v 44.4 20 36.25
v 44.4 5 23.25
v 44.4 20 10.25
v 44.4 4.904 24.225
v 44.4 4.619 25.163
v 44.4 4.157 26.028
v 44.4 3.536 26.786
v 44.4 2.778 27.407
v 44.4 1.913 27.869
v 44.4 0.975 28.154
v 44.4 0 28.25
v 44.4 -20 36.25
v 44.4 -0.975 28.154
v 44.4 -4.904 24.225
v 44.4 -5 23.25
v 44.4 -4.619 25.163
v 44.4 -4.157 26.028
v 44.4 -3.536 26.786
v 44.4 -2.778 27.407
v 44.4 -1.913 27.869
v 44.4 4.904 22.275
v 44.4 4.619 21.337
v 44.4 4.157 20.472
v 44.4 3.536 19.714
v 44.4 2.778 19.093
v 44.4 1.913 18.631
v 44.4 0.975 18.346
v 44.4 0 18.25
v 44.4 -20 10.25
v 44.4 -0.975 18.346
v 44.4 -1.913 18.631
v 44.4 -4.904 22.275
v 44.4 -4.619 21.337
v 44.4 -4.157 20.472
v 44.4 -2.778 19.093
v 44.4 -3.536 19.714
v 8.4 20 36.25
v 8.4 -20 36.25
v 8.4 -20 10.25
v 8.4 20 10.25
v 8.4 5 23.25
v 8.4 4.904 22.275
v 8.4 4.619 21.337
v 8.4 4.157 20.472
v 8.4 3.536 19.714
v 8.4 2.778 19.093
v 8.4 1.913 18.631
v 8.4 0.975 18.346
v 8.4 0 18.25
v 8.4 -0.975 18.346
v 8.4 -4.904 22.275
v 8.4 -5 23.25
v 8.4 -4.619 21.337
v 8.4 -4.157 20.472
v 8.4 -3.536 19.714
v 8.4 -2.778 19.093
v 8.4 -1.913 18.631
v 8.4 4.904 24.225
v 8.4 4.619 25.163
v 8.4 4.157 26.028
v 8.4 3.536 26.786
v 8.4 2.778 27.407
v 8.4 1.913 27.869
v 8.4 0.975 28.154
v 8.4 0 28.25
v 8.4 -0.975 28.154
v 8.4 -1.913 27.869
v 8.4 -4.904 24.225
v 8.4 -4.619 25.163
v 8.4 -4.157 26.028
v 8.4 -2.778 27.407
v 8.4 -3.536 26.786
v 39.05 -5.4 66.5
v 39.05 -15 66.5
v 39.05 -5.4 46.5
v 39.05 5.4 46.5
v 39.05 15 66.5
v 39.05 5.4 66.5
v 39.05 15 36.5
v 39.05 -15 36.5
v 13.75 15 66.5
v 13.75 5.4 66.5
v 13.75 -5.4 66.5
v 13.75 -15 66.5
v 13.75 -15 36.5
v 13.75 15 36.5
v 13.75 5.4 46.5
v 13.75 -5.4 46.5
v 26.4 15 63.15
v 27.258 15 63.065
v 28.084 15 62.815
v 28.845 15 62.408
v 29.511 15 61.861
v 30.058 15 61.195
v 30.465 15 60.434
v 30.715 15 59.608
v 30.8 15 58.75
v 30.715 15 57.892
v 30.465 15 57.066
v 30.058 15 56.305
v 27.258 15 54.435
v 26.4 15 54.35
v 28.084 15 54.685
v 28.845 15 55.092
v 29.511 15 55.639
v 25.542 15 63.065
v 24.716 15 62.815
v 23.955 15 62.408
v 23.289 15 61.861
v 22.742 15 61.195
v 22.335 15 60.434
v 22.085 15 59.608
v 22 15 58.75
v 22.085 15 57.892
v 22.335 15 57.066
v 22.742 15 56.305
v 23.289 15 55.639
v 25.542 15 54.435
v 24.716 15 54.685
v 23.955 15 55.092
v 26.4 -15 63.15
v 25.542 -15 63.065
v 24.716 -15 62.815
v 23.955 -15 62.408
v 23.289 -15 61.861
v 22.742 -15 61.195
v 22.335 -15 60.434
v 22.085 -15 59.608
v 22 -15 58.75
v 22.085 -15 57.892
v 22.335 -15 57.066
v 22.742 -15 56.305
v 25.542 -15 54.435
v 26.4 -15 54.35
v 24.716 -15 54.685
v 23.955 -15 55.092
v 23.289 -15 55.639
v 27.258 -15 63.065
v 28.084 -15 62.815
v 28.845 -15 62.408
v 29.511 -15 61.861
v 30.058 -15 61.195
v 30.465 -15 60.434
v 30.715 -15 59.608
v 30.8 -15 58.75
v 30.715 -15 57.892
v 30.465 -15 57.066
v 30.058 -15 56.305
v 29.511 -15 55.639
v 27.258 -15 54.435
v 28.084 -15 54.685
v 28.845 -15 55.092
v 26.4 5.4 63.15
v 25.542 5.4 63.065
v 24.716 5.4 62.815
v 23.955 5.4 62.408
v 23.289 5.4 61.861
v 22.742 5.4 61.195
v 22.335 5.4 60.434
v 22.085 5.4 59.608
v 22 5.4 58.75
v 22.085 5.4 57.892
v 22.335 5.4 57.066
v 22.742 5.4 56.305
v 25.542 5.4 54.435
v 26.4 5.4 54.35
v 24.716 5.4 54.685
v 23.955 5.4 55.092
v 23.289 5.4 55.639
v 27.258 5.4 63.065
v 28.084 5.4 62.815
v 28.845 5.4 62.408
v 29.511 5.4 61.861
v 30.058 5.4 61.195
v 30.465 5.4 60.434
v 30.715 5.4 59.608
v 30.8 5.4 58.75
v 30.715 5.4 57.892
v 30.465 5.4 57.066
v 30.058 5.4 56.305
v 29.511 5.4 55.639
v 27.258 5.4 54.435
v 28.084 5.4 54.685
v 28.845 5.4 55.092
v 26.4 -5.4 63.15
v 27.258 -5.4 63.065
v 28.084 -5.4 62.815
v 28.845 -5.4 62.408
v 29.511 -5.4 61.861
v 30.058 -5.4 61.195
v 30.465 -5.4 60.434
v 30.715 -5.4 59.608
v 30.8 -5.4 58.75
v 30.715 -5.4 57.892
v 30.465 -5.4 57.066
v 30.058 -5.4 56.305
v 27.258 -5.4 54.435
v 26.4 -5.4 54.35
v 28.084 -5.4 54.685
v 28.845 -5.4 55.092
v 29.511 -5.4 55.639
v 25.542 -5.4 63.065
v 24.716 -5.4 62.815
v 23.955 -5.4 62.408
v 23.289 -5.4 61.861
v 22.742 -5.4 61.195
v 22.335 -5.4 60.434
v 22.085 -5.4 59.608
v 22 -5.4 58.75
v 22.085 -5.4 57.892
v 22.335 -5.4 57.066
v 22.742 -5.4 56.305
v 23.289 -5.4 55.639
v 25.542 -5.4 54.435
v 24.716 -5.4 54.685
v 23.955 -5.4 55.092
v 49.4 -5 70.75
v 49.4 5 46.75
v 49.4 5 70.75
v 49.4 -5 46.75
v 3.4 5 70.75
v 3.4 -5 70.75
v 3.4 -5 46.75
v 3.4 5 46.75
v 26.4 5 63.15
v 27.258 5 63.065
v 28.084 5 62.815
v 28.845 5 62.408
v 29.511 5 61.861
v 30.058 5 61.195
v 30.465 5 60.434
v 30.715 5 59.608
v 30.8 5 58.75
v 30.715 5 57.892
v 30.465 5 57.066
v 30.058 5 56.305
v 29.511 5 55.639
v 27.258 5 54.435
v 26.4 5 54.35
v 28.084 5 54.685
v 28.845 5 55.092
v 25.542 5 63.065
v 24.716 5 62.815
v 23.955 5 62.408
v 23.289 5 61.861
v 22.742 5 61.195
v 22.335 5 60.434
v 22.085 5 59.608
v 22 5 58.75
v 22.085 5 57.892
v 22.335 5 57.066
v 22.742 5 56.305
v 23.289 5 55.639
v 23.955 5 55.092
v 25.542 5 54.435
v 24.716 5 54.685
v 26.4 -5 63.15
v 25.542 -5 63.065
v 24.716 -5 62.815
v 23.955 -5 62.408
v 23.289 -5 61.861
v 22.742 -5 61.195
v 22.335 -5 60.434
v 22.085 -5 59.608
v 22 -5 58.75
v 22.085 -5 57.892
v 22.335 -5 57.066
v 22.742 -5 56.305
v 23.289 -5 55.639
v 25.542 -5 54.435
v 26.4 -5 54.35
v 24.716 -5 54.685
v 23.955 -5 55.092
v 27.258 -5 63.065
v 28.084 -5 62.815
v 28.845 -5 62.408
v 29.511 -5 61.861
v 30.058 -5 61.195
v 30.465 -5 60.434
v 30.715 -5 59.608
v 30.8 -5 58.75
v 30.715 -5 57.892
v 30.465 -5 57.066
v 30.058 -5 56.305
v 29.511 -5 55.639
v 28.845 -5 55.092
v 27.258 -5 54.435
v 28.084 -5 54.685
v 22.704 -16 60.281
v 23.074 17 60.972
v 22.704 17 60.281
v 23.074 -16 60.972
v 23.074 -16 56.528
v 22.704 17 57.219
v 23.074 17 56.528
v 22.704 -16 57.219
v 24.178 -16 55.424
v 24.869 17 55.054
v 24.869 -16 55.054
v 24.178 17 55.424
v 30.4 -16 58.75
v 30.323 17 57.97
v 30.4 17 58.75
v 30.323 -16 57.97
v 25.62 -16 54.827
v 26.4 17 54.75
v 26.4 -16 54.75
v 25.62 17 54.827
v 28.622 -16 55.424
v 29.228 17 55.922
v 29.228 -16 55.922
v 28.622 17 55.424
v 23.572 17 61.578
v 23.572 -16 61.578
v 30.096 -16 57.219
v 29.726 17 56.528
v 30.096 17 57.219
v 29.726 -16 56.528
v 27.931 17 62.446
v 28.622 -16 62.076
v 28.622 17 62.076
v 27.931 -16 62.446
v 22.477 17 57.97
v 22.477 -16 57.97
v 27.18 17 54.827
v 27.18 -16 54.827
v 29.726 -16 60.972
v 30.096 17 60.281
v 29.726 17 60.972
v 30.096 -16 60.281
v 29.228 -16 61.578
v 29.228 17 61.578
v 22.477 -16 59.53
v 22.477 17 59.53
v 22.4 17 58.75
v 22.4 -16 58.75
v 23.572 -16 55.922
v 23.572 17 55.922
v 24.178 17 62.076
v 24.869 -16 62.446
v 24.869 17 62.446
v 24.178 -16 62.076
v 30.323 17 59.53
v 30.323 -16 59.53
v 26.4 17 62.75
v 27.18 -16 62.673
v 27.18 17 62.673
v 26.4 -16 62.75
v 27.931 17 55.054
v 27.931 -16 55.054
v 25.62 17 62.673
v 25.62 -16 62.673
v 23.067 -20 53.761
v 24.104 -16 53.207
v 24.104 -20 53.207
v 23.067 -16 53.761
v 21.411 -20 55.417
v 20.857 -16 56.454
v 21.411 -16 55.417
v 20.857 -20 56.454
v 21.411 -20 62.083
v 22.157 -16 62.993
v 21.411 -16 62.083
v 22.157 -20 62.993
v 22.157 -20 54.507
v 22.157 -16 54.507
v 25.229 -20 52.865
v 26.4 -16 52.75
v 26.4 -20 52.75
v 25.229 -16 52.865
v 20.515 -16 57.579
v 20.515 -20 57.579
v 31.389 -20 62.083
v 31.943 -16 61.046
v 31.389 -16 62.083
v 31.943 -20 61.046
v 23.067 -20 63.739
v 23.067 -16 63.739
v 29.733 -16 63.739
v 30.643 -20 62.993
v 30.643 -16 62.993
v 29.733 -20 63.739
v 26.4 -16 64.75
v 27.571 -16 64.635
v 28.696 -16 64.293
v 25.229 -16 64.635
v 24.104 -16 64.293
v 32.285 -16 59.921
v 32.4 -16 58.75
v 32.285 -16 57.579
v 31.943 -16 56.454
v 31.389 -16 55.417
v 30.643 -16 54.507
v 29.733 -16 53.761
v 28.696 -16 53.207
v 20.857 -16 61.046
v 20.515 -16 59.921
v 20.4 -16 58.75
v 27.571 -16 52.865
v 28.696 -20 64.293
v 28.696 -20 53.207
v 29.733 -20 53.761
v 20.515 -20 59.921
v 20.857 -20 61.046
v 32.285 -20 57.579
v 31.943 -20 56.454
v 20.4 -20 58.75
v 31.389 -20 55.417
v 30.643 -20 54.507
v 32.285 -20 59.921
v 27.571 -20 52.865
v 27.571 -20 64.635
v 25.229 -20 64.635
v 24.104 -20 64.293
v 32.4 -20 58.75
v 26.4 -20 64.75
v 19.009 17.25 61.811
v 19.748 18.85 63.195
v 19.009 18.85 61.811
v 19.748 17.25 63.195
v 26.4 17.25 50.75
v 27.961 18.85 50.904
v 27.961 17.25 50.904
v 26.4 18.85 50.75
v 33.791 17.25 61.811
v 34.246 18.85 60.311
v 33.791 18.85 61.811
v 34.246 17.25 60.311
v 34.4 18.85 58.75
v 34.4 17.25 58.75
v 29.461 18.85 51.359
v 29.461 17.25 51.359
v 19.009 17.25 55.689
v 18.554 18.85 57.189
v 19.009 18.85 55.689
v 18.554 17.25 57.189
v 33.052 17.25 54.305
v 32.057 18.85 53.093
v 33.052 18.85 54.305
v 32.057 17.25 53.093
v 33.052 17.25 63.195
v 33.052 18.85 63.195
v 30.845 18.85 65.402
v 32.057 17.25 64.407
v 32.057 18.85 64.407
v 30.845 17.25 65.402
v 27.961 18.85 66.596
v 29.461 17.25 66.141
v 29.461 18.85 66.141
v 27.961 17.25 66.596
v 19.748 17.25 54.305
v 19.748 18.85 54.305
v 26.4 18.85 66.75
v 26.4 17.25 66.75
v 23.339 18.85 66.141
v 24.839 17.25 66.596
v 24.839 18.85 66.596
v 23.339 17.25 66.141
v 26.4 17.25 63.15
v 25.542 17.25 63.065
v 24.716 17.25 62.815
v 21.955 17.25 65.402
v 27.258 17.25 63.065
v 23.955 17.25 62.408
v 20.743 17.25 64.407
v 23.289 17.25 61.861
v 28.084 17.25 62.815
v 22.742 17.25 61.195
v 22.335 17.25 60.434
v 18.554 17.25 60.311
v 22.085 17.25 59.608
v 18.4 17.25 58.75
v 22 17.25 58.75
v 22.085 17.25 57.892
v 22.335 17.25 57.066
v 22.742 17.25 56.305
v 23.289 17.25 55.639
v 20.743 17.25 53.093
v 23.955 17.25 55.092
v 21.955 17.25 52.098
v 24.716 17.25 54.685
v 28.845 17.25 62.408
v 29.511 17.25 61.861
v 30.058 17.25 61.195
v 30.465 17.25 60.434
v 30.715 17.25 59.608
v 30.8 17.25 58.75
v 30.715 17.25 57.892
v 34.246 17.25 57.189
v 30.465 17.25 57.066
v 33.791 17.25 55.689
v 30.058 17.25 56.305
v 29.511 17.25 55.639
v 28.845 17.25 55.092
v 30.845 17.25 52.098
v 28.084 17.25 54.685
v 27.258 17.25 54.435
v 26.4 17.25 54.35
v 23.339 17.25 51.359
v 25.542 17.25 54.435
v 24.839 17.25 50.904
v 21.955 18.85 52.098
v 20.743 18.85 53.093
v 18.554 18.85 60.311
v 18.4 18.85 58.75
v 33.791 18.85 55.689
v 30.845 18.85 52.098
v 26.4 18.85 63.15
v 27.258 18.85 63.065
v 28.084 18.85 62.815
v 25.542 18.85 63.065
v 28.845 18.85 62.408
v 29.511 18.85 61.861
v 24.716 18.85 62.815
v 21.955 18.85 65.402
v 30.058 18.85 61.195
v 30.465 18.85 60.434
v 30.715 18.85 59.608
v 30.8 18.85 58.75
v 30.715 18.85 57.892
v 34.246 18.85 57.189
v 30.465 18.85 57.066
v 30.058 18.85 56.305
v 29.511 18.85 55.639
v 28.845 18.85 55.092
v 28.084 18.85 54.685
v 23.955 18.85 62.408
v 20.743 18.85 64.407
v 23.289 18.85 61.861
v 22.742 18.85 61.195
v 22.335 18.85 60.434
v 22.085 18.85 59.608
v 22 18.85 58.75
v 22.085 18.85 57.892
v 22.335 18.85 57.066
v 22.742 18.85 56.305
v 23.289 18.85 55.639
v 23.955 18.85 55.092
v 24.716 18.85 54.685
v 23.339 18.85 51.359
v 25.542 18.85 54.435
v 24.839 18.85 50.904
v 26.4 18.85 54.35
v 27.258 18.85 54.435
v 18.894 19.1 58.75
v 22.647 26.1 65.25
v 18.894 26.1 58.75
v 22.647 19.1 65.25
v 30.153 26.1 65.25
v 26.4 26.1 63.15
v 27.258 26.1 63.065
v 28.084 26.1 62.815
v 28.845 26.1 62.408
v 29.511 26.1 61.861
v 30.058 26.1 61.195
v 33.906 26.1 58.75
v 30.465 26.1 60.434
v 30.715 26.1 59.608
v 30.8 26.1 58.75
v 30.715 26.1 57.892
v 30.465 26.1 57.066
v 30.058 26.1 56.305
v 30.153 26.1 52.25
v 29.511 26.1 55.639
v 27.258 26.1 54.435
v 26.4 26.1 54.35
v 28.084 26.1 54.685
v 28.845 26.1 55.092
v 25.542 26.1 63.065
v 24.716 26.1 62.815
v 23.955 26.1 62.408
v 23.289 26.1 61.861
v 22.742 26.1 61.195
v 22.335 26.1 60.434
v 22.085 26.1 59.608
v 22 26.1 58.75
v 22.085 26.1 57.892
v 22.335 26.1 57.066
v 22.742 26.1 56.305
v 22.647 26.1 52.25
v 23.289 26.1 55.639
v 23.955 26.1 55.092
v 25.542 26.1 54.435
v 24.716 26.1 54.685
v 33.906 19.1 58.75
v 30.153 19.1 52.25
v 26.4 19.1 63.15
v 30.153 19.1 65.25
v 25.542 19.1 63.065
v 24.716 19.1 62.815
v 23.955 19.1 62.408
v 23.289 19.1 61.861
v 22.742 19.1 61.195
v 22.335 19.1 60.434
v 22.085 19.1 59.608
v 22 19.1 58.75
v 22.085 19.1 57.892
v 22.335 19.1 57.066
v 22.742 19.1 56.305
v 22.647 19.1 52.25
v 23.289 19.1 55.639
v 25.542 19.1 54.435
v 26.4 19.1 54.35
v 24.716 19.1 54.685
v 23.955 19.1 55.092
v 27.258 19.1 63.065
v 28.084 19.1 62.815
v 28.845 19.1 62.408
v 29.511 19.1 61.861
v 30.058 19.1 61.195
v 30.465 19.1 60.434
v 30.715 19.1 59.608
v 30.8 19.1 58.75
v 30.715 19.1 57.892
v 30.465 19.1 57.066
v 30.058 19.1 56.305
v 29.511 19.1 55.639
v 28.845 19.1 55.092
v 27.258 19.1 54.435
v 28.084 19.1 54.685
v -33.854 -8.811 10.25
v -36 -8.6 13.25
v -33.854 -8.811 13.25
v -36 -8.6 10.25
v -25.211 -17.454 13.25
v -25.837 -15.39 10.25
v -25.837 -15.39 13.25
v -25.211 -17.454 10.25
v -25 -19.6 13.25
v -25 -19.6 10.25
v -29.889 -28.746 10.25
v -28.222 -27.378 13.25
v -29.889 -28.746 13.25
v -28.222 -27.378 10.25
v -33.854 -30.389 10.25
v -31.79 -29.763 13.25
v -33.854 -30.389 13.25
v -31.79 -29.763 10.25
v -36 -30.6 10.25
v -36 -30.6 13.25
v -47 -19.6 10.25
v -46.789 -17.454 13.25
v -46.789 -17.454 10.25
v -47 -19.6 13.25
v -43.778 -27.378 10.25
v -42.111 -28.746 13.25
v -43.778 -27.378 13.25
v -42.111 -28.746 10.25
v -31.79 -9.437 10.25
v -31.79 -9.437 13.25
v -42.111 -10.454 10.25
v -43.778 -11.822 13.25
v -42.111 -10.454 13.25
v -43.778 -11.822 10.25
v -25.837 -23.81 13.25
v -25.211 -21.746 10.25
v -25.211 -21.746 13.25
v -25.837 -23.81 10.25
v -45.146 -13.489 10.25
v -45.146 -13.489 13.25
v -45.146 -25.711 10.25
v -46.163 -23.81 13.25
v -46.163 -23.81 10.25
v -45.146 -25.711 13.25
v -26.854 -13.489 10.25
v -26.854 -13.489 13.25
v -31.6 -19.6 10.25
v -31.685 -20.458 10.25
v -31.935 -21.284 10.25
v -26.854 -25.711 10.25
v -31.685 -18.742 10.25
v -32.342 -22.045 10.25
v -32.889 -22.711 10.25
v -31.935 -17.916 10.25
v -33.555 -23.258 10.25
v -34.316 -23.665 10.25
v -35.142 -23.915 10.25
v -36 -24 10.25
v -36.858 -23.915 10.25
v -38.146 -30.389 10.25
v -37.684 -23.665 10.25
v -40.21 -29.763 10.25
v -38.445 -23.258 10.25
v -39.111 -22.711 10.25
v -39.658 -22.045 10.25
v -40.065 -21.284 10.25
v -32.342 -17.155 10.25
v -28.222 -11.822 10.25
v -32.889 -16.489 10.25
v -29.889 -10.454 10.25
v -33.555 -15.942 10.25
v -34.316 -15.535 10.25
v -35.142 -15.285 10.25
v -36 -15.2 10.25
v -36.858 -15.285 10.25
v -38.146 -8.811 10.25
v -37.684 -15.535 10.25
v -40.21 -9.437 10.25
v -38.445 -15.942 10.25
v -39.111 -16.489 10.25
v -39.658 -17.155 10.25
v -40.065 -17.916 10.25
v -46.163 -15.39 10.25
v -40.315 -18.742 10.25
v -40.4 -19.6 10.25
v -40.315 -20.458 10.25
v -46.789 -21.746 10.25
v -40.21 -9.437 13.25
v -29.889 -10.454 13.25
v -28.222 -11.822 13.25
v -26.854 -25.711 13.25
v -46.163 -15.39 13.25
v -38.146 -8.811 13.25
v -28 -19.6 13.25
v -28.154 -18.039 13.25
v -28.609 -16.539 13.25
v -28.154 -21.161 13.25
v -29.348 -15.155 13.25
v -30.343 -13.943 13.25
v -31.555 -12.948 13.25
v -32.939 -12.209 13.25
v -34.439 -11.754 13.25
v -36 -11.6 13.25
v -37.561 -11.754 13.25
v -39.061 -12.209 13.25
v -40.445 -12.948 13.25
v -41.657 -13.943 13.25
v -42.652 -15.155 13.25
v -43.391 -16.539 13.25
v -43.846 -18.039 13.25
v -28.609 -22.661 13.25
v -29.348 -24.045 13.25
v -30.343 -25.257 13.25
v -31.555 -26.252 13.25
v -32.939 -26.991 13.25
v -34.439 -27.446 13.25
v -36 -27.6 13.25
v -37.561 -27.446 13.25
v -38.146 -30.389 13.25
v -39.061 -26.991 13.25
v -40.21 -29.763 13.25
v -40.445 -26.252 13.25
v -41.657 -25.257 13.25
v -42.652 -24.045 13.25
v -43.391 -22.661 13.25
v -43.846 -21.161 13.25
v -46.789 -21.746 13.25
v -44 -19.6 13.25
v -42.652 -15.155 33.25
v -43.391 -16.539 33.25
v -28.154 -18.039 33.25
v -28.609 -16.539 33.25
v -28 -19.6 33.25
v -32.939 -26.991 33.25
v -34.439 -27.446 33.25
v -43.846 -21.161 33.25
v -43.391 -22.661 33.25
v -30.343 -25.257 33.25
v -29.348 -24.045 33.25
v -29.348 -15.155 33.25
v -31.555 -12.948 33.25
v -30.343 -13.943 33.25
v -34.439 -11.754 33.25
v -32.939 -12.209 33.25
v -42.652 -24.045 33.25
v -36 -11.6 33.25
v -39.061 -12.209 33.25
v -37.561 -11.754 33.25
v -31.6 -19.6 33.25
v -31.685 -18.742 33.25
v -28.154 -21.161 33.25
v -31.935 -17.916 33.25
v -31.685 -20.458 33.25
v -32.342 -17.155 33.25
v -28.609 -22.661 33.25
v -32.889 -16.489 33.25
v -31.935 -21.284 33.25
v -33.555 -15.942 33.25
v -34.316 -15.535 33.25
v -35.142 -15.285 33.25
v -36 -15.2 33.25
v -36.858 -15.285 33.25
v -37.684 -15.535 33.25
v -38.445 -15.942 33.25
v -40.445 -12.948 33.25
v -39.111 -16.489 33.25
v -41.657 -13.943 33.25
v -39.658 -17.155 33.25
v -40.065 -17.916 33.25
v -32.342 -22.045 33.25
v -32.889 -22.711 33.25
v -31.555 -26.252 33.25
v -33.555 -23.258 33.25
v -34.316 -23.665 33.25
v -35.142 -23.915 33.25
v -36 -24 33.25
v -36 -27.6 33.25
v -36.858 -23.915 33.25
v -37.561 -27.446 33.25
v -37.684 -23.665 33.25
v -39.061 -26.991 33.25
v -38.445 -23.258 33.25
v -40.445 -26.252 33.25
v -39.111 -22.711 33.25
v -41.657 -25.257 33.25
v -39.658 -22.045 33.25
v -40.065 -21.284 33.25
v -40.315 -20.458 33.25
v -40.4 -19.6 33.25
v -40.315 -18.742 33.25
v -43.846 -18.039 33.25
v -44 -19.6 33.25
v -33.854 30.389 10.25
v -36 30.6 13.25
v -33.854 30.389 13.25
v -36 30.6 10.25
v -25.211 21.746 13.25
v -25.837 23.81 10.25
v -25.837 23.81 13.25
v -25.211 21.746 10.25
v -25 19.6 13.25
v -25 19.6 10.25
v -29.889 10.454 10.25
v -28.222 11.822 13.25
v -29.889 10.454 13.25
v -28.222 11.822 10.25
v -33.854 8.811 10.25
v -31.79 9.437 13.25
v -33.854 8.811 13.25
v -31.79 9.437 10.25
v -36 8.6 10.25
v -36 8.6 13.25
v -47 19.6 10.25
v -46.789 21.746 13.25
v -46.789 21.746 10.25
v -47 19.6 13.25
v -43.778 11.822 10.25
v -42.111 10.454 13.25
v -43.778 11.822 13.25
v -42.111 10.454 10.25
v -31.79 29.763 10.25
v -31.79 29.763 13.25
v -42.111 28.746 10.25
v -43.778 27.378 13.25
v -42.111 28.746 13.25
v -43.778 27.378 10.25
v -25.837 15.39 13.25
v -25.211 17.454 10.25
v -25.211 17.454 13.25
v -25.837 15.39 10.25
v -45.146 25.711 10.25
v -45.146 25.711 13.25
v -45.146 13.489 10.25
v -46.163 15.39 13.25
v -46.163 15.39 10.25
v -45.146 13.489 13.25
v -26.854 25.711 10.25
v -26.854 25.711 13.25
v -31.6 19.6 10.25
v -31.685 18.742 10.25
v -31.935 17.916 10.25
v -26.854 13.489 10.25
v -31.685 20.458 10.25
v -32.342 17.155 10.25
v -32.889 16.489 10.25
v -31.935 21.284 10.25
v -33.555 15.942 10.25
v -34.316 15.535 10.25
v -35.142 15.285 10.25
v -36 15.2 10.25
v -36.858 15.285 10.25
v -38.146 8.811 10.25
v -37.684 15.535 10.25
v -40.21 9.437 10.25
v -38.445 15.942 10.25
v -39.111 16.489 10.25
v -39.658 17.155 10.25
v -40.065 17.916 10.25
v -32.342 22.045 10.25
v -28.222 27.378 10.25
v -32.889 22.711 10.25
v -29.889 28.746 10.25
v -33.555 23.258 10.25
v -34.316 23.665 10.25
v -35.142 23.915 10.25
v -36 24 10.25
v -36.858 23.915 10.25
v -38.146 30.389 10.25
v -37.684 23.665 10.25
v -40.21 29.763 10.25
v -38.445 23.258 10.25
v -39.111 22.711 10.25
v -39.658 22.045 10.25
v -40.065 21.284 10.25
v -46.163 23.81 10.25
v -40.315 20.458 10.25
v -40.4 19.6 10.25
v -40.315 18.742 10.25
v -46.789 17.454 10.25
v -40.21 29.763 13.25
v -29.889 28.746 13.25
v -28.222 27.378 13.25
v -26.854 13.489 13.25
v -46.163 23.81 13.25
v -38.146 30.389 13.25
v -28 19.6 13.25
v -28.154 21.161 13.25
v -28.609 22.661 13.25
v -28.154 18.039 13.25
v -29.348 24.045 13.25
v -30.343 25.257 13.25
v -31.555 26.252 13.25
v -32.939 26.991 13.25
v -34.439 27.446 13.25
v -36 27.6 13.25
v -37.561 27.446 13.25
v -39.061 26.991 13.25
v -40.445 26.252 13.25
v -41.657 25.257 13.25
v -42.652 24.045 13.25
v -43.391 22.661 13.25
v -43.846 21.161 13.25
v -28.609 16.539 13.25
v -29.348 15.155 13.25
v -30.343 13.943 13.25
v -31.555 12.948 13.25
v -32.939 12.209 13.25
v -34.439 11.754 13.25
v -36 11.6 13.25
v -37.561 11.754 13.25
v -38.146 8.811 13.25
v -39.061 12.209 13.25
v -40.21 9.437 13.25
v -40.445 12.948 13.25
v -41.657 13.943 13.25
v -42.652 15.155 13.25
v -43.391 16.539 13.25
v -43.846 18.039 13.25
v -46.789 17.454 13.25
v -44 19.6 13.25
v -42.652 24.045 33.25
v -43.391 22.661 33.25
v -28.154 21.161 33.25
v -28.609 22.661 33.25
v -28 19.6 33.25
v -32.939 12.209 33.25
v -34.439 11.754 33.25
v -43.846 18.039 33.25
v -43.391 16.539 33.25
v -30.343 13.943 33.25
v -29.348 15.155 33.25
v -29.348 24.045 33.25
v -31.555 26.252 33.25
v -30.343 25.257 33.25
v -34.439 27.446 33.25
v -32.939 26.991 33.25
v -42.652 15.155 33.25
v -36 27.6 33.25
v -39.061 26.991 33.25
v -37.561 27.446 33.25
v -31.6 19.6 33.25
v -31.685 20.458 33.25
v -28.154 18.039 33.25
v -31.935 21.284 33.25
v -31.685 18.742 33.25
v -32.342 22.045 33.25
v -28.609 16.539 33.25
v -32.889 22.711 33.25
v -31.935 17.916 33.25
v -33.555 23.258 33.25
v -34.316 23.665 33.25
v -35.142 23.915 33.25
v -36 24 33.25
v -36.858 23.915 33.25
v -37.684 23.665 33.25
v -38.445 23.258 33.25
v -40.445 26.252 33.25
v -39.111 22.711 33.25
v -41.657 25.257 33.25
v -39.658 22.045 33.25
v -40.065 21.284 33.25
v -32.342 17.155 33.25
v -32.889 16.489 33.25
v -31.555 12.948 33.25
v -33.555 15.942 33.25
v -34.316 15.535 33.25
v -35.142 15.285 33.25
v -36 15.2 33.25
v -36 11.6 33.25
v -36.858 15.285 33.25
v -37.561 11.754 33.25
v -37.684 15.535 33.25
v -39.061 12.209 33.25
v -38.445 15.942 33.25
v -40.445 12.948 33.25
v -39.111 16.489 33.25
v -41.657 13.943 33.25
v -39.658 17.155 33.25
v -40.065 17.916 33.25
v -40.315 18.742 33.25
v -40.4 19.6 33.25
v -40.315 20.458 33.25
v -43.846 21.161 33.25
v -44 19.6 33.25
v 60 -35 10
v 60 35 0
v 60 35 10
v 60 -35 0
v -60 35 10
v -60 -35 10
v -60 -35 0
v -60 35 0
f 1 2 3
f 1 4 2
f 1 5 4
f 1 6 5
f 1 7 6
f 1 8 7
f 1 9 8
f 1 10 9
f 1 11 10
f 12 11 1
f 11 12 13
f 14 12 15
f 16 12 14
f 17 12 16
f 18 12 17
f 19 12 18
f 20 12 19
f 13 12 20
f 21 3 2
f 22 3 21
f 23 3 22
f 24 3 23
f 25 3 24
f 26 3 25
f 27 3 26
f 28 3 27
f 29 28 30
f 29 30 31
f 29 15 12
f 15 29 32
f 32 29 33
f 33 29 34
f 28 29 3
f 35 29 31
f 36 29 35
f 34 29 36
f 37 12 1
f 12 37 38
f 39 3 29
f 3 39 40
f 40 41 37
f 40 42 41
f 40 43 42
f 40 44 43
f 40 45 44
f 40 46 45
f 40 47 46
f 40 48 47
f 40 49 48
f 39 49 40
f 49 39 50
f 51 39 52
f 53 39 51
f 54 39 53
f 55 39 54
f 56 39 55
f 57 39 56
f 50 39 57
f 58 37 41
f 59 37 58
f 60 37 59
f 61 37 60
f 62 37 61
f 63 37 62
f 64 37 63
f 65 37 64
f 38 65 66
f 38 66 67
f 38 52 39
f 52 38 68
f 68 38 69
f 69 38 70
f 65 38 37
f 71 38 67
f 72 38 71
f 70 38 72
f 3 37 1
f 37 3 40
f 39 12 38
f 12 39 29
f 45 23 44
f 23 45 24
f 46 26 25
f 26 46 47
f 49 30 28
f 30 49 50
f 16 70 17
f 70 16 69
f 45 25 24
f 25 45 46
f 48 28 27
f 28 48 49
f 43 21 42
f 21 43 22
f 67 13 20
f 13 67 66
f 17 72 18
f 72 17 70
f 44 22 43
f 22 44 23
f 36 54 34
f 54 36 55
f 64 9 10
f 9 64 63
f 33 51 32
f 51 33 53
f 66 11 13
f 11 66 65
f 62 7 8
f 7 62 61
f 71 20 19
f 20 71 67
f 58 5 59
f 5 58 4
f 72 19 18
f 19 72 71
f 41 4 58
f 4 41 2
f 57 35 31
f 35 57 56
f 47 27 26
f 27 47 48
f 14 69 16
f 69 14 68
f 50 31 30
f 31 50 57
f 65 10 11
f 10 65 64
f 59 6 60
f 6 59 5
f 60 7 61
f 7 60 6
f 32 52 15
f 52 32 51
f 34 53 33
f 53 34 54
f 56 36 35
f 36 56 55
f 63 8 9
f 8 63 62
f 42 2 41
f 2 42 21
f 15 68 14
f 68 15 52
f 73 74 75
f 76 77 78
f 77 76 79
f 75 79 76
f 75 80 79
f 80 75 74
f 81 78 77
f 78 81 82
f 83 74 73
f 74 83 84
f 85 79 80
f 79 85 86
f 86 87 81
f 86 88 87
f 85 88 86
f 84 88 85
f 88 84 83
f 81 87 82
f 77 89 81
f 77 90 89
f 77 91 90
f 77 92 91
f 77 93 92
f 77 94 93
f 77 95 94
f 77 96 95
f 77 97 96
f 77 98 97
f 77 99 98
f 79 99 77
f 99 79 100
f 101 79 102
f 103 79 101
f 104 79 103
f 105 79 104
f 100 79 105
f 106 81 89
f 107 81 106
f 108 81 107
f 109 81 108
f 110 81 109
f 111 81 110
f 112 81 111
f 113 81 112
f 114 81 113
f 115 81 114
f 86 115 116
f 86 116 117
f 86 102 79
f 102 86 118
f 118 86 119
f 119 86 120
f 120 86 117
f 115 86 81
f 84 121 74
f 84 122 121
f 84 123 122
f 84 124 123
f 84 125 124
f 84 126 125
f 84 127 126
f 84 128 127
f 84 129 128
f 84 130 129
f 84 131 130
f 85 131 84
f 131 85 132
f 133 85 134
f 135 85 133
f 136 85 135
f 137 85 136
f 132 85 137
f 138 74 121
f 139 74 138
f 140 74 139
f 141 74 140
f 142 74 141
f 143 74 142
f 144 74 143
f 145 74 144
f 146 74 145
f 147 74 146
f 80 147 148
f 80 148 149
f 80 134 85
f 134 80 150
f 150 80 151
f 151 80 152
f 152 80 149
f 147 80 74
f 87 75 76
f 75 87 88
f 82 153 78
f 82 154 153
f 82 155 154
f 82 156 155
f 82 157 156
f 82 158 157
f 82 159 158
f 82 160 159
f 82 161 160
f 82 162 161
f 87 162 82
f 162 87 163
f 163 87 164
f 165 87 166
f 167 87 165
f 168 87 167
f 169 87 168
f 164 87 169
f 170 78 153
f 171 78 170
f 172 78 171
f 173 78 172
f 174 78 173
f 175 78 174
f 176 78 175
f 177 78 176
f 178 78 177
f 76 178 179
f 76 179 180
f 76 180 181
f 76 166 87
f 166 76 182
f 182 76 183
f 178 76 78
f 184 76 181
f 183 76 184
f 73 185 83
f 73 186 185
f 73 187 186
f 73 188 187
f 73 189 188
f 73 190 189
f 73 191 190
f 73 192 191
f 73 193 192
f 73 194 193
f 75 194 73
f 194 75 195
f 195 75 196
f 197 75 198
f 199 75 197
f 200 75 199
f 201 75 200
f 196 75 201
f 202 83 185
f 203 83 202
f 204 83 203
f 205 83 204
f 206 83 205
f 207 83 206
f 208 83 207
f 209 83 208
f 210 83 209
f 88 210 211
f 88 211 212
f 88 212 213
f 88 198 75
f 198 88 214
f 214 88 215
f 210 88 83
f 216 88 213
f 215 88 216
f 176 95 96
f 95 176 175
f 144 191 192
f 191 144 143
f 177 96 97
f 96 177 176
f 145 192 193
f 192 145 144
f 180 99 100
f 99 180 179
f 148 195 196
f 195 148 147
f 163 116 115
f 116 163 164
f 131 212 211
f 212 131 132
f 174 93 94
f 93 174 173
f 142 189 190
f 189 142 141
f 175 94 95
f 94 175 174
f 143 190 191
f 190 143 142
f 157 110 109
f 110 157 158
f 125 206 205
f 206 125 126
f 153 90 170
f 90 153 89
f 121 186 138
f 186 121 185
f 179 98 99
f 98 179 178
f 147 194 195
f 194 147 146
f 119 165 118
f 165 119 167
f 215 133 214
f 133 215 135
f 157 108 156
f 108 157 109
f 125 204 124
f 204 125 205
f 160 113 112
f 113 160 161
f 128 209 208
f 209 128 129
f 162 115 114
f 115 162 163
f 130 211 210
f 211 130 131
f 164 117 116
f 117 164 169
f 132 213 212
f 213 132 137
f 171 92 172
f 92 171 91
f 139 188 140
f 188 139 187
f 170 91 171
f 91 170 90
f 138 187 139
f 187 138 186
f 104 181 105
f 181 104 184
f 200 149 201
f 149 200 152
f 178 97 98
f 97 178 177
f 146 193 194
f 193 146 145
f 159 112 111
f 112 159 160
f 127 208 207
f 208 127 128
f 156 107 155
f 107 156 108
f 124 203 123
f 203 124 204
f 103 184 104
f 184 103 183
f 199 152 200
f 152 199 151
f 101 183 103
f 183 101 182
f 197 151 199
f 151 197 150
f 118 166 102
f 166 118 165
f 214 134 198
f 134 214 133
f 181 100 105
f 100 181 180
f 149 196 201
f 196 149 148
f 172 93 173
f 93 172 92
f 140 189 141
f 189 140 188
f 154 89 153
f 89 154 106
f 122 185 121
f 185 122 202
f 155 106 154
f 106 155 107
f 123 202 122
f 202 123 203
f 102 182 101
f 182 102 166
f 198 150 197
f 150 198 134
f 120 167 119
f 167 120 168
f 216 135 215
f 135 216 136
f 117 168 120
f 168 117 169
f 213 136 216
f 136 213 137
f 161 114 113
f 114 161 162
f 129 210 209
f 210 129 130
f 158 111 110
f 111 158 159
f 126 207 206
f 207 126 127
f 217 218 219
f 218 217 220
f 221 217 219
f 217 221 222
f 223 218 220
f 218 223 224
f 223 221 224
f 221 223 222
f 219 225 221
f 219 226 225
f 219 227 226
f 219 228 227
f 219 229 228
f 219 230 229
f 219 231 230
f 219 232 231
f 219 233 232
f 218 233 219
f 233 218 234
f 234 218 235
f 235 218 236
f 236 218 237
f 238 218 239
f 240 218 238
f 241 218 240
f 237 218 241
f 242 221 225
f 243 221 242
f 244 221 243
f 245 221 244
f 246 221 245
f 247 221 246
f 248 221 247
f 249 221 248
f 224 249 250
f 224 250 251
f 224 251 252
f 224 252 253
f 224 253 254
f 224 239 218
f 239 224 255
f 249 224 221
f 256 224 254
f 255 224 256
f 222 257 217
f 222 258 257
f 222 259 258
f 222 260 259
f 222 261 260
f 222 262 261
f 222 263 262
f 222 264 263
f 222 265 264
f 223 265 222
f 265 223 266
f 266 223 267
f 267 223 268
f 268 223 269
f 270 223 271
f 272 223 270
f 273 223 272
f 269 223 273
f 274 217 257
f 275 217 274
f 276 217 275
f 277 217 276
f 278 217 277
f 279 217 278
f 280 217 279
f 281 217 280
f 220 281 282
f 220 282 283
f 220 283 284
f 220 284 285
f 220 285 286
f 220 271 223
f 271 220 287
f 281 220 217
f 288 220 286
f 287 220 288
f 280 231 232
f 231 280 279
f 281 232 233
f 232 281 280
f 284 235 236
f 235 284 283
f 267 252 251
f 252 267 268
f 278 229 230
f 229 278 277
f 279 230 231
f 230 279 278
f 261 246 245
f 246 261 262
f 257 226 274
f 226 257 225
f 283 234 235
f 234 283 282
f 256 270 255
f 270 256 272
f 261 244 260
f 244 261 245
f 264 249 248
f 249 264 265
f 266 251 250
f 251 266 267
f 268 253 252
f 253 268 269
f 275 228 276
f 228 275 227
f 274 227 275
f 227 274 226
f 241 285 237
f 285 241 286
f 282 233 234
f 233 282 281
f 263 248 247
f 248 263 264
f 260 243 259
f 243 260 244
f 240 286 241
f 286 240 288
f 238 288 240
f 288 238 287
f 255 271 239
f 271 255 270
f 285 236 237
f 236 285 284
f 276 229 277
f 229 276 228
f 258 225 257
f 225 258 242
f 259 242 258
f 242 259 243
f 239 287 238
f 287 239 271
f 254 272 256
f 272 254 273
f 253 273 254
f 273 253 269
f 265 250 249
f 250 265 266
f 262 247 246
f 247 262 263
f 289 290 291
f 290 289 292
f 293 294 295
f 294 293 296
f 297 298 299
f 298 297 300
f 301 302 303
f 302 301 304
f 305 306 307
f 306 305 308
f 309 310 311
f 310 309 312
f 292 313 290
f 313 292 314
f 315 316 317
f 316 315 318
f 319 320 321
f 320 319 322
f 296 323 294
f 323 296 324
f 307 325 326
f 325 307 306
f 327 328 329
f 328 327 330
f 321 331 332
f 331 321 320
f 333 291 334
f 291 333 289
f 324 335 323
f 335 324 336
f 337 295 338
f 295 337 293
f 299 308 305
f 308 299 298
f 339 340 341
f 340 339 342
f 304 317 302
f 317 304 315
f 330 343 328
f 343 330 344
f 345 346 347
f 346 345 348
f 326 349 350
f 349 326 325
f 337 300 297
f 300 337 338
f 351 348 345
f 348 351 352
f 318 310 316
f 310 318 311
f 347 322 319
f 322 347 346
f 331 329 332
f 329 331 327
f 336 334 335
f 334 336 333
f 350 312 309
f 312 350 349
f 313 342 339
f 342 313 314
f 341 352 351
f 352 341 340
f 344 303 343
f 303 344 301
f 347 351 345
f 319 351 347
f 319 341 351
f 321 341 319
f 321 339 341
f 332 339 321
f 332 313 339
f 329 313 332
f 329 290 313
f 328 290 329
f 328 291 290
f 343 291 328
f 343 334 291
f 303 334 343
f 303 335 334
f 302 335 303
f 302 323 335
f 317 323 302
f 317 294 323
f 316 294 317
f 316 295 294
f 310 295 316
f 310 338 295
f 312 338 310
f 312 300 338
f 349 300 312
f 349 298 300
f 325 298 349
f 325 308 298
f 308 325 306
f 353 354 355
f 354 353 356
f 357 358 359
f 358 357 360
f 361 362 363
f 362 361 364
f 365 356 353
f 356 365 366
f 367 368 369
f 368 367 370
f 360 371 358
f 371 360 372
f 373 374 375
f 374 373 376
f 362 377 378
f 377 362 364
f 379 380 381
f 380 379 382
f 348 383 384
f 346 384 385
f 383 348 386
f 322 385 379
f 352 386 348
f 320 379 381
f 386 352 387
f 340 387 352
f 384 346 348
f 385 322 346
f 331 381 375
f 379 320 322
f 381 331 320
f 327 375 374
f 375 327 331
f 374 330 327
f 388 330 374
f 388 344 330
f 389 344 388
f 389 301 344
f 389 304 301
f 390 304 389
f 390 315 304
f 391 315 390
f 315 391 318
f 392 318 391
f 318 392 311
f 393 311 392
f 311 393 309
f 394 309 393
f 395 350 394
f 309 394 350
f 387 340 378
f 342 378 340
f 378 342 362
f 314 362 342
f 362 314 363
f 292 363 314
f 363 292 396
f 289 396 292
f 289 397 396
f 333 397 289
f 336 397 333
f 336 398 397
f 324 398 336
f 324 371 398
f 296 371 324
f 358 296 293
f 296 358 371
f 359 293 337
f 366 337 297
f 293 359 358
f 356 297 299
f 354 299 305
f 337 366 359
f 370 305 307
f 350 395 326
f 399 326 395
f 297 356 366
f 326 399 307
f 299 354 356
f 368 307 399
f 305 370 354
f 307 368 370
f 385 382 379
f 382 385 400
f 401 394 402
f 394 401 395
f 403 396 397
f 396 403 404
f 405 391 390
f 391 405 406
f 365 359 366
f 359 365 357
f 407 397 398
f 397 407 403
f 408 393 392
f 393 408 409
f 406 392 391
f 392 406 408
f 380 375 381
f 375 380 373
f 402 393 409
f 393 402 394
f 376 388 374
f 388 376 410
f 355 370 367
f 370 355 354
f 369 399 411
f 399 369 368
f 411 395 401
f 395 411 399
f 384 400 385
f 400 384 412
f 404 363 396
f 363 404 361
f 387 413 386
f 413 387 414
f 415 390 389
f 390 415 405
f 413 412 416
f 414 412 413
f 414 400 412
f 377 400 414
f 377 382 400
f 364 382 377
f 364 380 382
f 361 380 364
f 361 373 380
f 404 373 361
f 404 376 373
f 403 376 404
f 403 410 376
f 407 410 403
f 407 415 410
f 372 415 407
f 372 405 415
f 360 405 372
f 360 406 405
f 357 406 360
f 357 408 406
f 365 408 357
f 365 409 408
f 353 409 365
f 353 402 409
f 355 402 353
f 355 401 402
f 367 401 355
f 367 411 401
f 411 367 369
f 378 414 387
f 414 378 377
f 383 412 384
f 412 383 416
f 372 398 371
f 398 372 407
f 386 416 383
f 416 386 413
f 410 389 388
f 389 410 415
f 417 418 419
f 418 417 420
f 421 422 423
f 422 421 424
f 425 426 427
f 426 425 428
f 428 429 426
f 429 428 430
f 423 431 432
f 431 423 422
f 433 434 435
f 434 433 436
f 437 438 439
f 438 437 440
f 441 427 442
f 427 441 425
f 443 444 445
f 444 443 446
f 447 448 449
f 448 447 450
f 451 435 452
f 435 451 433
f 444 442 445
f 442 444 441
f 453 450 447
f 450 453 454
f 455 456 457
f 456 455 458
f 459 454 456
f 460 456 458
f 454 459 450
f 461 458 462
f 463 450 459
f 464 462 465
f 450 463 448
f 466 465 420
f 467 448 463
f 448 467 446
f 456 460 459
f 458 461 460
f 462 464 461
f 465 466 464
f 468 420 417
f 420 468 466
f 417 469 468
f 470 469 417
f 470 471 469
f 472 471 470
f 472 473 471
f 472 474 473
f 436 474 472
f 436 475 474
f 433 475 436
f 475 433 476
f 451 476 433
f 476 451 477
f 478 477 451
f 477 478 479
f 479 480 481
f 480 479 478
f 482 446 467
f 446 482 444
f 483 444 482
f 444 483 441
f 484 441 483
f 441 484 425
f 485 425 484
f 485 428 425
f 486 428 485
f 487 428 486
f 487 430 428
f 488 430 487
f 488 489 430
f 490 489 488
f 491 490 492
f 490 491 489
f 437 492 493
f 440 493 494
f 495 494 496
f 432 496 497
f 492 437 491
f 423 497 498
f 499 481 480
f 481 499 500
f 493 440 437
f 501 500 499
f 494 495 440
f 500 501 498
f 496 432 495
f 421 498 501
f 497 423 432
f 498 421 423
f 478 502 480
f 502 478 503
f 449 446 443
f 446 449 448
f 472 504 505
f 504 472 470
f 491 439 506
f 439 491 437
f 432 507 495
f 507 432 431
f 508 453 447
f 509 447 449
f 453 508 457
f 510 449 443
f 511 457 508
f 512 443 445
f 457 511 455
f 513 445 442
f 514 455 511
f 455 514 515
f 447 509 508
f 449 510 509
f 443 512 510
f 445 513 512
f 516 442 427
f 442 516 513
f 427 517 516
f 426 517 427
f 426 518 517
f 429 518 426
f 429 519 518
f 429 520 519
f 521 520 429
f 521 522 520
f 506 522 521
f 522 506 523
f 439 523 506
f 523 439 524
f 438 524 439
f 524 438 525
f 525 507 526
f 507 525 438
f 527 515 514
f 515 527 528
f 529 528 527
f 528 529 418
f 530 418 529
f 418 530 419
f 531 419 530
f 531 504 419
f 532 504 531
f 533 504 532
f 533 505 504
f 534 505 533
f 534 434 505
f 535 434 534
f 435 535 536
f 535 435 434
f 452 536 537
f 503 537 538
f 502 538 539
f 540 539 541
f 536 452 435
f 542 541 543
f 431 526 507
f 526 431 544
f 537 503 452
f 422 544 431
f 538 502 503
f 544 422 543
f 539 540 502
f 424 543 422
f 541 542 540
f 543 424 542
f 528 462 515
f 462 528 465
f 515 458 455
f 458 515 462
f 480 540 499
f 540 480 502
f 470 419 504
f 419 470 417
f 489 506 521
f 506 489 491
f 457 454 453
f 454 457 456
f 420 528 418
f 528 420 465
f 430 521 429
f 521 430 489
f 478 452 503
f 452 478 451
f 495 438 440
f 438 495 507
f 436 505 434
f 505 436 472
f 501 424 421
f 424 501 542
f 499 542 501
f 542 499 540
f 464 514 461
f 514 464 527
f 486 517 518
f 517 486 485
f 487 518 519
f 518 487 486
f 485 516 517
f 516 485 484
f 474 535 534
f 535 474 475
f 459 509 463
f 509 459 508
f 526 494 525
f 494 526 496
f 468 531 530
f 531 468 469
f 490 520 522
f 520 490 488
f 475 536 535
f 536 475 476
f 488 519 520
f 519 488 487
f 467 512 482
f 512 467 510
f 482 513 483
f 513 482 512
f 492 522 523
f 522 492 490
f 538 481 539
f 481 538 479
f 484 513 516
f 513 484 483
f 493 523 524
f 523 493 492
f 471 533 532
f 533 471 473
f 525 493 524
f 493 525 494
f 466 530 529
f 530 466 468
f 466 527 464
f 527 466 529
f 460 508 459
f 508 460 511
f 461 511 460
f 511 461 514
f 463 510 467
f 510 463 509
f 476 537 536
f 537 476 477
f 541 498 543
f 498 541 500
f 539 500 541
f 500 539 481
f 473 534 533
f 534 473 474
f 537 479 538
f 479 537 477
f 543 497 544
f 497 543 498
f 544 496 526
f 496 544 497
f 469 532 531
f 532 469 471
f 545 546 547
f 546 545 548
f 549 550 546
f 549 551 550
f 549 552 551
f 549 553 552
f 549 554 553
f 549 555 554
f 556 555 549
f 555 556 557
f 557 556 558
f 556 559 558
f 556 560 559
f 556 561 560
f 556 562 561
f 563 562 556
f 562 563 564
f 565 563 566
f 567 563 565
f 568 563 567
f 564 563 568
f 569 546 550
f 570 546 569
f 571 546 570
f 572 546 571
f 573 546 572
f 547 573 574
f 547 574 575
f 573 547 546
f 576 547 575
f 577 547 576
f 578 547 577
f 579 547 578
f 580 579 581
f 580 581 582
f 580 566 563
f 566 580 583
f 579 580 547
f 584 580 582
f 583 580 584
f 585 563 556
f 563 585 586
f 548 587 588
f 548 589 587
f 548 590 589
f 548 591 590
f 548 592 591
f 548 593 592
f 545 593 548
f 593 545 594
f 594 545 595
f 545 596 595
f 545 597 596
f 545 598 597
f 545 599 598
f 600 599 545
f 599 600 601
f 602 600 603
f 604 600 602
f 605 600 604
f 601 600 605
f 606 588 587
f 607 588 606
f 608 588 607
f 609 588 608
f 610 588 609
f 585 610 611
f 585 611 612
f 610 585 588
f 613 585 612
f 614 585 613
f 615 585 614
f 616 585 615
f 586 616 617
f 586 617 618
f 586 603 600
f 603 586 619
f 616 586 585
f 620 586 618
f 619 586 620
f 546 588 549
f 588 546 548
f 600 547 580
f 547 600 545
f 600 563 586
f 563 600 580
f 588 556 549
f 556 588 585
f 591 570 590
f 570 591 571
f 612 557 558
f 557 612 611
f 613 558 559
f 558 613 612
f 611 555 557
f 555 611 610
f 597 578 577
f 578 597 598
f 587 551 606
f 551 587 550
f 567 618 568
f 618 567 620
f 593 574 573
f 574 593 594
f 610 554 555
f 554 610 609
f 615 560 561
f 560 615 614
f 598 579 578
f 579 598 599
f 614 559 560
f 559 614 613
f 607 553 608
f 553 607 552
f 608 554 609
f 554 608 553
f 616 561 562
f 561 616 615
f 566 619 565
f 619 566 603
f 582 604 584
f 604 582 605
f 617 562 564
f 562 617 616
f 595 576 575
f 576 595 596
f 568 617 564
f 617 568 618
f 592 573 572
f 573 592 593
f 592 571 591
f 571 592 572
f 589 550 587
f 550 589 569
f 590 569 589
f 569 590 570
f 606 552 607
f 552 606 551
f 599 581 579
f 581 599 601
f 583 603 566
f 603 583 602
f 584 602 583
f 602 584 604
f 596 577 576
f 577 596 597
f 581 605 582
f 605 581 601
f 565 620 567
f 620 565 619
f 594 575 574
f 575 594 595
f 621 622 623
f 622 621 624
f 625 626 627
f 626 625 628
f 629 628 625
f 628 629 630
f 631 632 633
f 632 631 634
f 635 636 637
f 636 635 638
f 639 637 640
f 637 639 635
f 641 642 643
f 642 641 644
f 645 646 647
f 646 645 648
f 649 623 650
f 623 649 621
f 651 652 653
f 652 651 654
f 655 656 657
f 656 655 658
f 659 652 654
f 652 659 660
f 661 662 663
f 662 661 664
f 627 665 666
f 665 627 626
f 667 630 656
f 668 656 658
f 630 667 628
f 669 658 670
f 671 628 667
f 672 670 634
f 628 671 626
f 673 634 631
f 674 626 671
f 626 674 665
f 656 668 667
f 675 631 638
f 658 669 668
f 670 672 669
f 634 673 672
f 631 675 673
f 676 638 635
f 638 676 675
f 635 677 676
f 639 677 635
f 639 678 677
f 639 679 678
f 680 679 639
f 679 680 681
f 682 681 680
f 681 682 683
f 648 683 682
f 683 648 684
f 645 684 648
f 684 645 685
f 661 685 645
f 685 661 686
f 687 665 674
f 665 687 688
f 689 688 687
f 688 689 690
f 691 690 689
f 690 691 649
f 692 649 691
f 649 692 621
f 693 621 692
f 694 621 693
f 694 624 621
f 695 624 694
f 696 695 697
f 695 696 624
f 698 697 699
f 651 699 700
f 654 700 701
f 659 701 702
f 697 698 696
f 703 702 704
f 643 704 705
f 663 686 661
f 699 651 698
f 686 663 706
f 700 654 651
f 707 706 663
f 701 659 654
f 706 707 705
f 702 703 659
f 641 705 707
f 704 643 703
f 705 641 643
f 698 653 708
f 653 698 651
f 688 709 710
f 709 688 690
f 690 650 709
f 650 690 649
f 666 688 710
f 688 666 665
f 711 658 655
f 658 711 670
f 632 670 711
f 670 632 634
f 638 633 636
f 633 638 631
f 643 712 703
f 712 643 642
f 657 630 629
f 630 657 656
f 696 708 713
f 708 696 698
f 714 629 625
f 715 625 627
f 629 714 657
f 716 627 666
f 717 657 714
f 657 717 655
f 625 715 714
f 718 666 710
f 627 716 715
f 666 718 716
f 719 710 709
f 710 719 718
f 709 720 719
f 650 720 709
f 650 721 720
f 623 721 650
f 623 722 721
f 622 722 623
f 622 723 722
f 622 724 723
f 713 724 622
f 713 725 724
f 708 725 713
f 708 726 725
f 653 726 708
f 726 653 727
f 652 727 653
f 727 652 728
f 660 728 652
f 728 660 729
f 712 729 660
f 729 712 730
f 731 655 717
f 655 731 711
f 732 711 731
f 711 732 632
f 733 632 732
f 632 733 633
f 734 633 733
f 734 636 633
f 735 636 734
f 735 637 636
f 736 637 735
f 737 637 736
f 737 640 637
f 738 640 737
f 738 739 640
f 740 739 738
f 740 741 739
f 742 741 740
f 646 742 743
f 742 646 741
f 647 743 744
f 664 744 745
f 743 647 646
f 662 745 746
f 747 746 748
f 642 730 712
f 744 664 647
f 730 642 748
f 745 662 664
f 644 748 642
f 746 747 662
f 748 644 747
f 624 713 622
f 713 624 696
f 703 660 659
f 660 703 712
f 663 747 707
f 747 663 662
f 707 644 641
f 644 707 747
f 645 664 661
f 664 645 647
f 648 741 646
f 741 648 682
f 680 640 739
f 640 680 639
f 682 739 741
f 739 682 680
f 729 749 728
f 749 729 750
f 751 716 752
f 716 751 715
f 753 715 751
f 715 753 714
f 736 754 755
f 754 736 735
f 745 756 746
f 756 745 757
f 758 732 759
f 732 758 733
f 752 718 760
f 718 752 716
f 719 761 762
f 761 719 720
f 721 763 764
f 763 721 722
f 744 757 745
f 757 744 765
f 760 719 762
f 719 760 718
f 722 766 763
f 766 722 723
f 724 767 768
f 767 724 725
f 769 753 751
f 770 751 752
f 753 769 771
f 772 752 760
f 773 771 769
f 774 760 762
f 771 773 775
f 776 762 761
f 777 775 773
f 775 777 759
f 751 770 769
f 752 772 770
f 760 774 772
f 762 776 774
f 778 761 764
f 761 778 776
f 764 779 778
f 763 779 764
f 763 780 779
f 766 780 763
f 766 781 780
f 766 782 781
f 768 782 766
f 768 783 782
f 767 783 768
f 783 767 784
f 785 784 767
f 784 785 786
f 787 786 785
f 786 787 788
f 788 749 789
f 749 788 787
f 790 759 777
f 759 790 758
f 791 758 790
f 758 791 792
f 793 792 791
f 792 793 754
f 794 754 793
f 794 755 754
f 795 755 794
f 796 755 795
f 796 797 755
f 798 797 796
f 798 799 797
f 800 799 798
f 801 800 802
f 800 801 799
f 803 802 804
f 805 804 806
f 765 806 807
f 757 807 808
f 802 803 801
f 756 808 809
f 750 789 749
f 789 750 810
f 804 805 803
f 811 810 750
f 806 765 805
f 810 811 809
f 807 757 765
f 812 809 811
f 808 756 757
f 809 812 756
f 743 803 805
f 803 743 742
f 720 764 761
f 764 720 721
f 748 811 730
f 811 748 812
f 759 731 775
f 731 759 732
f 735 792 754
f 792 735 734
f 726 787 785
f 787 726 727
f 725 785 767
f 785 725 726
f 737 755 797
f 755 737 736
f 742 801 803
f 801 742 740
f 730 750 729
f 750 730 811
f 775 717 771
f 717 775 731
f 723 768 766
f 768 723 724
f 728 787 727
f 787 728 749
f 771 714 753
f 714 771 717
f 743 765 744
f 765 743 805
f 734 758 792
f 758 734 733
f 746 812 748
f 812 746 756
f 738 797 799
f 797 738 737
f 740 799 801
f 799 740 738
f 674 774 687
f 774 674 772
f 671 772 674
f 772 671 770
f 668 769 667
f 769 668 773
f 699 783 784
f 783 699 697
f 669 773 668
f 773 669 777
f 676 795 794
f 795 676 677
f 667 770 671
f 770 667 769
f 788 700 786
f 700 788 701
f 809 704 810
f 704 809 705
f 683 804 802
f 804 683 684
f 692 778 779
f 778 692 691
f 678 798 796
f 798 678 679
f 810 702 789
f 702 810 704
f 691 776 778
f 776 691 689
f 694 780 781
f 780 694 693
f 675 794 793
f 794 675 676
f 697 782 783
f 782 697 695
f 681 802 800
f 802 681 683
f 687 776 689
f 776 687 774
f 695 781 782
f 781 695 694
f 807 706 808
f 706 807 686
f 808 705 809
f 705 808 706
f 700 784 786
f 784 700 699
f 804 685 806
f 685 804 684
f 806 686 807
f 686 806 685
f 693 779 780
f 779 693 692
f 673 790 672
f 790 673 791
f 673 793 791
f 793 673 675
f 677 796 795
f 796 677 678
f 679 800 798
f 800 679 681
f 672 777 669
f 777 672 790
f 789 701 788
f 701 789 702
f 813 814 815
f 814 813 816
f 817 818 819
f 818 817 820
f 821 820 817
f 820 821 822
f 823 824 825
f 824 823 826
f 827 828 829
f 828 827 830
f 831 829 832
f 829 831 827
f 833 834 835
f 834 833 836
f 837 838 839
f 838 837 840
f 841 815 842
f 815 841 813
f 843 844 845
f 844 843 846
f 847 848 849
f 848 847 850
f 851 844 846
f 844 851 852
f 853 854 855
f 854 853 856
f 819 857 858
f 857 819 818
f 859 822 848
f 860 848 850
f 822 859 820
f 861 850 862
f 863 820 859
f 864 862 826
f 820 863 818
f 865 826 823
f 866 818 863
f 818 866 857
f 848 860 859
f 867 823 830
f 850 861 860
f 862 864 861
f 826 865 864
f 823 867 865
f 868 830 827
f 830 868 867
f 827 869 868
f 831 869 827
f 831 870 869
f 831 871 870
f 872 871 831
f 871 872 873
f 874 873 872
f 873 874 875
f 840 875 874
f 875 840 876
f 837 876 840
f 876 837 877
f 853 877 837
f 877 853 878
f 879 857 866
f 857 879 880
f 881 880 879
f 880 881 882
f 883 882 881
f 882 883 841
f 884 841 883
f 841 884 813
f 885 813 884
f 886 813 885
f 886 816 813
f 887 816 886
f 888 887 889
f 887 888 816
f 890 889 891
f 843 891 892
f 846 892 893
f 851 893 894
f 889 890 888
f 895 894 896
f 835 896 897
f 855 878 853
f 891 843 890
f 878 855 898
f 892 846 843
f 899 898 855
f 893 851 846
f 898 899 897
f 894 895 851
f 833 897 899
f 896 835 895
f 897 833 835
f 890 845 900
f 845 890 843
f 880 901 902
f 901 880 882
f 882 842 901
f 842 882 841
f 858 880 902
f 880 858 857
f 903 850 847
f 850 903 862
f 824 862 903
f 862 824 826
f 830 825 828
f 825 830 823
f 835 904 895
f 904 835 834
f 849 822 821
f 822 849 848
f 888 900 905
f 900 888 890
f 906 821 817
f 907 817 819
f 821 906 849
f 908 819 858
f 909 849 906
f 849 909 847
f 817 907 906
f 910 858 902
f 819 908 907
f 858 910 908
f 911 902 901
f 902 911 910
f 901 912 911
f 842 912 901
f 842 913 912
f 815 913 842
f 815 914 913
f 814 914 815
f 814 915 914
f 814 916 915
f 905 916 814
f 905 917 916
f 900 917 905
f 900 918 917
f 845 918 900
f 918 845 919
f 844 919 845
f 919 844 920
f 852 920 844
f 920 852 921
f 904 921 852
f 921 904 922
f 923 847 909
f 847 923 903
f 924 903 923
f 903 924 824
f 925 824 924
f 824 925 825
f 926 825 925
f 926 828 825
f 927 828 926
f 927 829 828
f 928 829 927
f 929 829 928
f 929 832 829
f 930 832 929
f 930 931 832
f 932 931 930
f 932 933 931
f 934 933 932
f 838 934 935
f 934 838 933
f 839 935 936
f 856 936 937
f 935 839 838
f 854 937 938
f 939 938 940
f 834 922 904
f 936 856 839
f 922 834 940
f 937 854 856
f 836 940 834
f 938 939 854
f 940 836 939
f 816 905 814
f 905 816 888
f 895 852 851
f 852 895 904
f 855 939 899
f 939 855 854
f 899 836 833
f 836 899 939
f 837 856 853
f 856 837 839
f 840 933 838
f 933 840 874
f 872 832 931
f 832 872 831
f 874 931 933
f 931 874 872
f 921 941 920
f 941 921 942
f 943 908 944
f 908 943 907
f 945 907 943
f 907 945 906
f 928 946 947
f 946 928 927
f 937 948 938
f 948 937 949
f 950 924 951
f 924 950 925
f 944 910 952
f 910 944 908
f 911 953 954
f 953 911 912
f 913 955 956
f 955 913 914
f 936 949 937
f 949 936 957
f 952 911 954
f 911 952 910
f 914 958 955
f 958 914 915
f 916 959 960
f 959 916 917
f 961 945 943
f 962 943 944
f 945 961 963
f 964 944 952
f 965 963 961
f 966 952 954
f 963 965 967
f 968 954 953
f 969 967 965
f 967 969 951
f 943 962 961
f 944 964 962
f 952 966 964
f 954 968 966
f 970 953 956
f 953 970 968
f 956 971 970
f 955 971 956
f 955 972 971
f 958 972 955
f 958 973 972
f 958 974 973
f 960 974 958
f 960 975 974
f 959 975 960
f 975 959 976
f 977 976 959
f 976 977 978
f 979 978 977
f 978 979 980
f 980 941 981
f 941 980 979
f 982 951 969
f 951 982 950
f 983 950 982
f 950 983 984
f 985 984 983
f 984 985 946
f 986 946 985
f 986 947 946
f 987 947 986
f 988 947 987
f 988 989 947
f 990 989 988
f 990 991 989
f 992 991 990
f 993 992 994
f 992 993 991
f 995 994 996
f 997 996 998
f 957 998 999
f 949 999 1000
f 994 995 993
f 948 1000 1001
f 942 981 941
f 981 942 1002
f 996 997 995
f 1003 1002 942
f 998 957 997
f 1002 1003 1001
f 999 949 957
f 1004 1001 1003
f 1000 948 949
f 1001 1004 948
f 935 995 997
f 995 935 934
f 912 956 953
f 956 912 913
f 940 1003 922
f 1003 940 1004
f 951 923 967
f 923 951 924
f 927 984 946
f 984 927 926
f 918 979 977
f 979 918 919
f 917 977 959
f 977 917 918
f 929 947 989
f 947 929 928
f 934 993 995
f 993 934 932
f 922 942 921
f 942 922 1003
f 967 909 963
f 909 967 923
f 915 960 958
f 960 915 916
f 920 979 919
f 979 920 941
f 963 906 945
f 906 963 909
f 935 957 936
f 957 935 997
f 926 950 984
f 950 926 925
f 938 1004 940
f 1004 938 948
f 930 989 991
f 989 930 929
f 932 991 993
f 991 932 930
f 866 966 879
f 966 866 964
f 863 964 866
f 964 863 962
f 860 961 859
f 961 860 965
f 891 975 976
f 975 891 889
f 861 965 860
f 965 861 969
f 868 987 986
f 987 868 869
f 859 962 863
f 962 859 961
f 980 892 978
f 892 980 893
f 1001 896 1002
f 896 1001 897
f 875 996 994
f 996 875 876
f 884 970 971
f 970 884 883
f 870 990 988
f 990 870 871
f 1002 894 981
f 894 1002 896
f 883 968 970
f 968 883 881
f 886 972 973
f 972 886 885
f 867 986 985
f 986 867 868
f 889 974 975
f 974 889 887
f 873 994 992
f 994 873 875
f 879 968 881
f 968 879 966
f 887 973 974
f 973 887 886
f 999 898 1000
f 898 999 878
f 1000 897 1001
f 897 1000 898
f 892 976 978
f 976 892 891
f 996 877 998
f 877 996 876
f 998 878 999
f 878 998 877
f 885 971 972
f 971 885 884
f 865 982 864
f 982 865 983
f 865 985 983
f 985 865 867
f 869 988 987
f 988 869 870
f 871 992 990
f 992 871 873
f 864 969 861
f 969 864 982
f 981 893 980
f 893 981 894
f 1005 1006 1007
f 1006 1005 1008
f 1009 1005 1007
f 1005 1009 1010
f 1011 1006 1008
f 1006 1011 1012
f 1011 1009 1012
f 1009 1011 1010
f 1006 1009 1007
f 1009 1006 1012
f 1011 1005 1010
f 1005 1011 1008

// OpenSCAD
$fn = 32;

// ------------------------------------------------------------------------
// Indexing jig: plate 120 x 70 mm, pin d8
// Every part is its own module, assembly() places every instance.
// ------------------------------------------------------------------------

// --- part 1 ---
module jig_plate() {
  difference() {
    translate([-60, -35, 0]) cube([120, 70, 10]);
  }
}

// --- part 2 ---
module locator_block() {
  difference() {
    translate([-18, -20, 0]) cube([36, 40, 26]);
    translate([0, 0, 13]) rotate([0, 90, 0]) cylinder(h = 38, d = 10, center = true);
  }
}

// --- part 3 ---
module index_fork() {
  difference() {
    translate([-12.65, -15, 0]) cube([25.3, 30, 30]);
    translate([-13.65, -5.4, 10]) cube([27.3, 10.8, 21]);
    translate([0, 0, 22.25]) rotate([90, 0, 0]) cylinder(h = 32, d = 8.8, center = true);
  }
}

// --- part 4 ---
module index_arm() {
  difference() {
    translate([-23, -5, 0]) cube([46, 10, 24]);
    translate([0, 0, 12]) rotate([90, 0, 0]) cylinder(h = 12, d = 8.8, center = true);
  }
}

// --- part 5 ---
module index_pin() {
  rotate([0, 90, 0]) cylinder(h = 34, d = 8, center = true);
  translate([-20, 0, 0]) rotate([0, 90, 0]) cylinder(h = 4, d = 12);
}

// --- part 6 ---
module pin_washer() {
  difference() {
      translate([0, 0, 0]) cylinder(h = 1.6, d = 16);
      translate([0, 0, -1]) cylinder(h = 3.6, d = 8.8);
    }
}

// --- part 7 ---
module lock_nut() {
  difference() {
    linear_extrude(height = 7) polygon(points = [[7.506, 0], [3.753, 6.5], [-3.753, 6.5], [-7.506, 0], [-3.753, -6.5], [3.753, -6.5]]);
    translate([0, 0, -1]) cylinder(h = 9, d = 8.8);
  }
}

// --- part 8 ---
module guide_bush_a() {
  difference() {
    union() {
      cylinder(h = 3, d = 22);
      translate([0, 0, 3]) cylinder(h = 20, d = 16);
    }
    translate([0, 0, -1]) cylinder(h = 25, d = 8.8);
  }
}

// --- part 9 ---
module guide_bush_b() {
  difference() {
    union() {
      cylinder(h = 3, d = 22);
      translate([0, 0, 3]) cylinder(h = 20, d = 16);
    }
    translate([0, 0, -1]) cylinder(h = 25, d = 8.8);
  }
}

// --- assembly ---
module assembly() {
  color([0.80, 0.24, 0.20]) translate([0, 0, 0]) rotate([0, 0, 0]) jig_plate();
  color([0.20, 0.45, 0.75]) translate([26.4, 0, 10.25]) rotate([0, 0, 0]) locator_block();
  color([0.25, 0.62, 0.32]) translate([26.4, 0, 36.5]) rotate([0, 0, 0]) index_fork();
  color([0.92, 0.70, 0.18]) translate([26.4, 0, 46.75]) rotate([0, 0, 0]) index_arm();
  color([0.58, 0.35, 0.70]) translate([26.4, 0, 58.75]) rotate([0, 0, 90]) index_pin();
  color([0.16, 0.66, 0.66]) translate([26.4, 18.85, 58.75]) rotate([90, 0, 0]) pin_washer();
  color([0.85, 0.48, 0.18]) translate([26.4, 26.1, 58.75]) rotate([90, 0, 0]) lock_nut();
  color([0.55, 0.60, 0.65]) translate([-36, -19.6, 10.25]) rotate([0, 0, 0]) guide_bush_a();
  color([0.75, 0.30, 0.55]) translate([-36, 19.6, 10.25]) rotate([0, 0, 0]) guide_bush_b();
}

assembly();
